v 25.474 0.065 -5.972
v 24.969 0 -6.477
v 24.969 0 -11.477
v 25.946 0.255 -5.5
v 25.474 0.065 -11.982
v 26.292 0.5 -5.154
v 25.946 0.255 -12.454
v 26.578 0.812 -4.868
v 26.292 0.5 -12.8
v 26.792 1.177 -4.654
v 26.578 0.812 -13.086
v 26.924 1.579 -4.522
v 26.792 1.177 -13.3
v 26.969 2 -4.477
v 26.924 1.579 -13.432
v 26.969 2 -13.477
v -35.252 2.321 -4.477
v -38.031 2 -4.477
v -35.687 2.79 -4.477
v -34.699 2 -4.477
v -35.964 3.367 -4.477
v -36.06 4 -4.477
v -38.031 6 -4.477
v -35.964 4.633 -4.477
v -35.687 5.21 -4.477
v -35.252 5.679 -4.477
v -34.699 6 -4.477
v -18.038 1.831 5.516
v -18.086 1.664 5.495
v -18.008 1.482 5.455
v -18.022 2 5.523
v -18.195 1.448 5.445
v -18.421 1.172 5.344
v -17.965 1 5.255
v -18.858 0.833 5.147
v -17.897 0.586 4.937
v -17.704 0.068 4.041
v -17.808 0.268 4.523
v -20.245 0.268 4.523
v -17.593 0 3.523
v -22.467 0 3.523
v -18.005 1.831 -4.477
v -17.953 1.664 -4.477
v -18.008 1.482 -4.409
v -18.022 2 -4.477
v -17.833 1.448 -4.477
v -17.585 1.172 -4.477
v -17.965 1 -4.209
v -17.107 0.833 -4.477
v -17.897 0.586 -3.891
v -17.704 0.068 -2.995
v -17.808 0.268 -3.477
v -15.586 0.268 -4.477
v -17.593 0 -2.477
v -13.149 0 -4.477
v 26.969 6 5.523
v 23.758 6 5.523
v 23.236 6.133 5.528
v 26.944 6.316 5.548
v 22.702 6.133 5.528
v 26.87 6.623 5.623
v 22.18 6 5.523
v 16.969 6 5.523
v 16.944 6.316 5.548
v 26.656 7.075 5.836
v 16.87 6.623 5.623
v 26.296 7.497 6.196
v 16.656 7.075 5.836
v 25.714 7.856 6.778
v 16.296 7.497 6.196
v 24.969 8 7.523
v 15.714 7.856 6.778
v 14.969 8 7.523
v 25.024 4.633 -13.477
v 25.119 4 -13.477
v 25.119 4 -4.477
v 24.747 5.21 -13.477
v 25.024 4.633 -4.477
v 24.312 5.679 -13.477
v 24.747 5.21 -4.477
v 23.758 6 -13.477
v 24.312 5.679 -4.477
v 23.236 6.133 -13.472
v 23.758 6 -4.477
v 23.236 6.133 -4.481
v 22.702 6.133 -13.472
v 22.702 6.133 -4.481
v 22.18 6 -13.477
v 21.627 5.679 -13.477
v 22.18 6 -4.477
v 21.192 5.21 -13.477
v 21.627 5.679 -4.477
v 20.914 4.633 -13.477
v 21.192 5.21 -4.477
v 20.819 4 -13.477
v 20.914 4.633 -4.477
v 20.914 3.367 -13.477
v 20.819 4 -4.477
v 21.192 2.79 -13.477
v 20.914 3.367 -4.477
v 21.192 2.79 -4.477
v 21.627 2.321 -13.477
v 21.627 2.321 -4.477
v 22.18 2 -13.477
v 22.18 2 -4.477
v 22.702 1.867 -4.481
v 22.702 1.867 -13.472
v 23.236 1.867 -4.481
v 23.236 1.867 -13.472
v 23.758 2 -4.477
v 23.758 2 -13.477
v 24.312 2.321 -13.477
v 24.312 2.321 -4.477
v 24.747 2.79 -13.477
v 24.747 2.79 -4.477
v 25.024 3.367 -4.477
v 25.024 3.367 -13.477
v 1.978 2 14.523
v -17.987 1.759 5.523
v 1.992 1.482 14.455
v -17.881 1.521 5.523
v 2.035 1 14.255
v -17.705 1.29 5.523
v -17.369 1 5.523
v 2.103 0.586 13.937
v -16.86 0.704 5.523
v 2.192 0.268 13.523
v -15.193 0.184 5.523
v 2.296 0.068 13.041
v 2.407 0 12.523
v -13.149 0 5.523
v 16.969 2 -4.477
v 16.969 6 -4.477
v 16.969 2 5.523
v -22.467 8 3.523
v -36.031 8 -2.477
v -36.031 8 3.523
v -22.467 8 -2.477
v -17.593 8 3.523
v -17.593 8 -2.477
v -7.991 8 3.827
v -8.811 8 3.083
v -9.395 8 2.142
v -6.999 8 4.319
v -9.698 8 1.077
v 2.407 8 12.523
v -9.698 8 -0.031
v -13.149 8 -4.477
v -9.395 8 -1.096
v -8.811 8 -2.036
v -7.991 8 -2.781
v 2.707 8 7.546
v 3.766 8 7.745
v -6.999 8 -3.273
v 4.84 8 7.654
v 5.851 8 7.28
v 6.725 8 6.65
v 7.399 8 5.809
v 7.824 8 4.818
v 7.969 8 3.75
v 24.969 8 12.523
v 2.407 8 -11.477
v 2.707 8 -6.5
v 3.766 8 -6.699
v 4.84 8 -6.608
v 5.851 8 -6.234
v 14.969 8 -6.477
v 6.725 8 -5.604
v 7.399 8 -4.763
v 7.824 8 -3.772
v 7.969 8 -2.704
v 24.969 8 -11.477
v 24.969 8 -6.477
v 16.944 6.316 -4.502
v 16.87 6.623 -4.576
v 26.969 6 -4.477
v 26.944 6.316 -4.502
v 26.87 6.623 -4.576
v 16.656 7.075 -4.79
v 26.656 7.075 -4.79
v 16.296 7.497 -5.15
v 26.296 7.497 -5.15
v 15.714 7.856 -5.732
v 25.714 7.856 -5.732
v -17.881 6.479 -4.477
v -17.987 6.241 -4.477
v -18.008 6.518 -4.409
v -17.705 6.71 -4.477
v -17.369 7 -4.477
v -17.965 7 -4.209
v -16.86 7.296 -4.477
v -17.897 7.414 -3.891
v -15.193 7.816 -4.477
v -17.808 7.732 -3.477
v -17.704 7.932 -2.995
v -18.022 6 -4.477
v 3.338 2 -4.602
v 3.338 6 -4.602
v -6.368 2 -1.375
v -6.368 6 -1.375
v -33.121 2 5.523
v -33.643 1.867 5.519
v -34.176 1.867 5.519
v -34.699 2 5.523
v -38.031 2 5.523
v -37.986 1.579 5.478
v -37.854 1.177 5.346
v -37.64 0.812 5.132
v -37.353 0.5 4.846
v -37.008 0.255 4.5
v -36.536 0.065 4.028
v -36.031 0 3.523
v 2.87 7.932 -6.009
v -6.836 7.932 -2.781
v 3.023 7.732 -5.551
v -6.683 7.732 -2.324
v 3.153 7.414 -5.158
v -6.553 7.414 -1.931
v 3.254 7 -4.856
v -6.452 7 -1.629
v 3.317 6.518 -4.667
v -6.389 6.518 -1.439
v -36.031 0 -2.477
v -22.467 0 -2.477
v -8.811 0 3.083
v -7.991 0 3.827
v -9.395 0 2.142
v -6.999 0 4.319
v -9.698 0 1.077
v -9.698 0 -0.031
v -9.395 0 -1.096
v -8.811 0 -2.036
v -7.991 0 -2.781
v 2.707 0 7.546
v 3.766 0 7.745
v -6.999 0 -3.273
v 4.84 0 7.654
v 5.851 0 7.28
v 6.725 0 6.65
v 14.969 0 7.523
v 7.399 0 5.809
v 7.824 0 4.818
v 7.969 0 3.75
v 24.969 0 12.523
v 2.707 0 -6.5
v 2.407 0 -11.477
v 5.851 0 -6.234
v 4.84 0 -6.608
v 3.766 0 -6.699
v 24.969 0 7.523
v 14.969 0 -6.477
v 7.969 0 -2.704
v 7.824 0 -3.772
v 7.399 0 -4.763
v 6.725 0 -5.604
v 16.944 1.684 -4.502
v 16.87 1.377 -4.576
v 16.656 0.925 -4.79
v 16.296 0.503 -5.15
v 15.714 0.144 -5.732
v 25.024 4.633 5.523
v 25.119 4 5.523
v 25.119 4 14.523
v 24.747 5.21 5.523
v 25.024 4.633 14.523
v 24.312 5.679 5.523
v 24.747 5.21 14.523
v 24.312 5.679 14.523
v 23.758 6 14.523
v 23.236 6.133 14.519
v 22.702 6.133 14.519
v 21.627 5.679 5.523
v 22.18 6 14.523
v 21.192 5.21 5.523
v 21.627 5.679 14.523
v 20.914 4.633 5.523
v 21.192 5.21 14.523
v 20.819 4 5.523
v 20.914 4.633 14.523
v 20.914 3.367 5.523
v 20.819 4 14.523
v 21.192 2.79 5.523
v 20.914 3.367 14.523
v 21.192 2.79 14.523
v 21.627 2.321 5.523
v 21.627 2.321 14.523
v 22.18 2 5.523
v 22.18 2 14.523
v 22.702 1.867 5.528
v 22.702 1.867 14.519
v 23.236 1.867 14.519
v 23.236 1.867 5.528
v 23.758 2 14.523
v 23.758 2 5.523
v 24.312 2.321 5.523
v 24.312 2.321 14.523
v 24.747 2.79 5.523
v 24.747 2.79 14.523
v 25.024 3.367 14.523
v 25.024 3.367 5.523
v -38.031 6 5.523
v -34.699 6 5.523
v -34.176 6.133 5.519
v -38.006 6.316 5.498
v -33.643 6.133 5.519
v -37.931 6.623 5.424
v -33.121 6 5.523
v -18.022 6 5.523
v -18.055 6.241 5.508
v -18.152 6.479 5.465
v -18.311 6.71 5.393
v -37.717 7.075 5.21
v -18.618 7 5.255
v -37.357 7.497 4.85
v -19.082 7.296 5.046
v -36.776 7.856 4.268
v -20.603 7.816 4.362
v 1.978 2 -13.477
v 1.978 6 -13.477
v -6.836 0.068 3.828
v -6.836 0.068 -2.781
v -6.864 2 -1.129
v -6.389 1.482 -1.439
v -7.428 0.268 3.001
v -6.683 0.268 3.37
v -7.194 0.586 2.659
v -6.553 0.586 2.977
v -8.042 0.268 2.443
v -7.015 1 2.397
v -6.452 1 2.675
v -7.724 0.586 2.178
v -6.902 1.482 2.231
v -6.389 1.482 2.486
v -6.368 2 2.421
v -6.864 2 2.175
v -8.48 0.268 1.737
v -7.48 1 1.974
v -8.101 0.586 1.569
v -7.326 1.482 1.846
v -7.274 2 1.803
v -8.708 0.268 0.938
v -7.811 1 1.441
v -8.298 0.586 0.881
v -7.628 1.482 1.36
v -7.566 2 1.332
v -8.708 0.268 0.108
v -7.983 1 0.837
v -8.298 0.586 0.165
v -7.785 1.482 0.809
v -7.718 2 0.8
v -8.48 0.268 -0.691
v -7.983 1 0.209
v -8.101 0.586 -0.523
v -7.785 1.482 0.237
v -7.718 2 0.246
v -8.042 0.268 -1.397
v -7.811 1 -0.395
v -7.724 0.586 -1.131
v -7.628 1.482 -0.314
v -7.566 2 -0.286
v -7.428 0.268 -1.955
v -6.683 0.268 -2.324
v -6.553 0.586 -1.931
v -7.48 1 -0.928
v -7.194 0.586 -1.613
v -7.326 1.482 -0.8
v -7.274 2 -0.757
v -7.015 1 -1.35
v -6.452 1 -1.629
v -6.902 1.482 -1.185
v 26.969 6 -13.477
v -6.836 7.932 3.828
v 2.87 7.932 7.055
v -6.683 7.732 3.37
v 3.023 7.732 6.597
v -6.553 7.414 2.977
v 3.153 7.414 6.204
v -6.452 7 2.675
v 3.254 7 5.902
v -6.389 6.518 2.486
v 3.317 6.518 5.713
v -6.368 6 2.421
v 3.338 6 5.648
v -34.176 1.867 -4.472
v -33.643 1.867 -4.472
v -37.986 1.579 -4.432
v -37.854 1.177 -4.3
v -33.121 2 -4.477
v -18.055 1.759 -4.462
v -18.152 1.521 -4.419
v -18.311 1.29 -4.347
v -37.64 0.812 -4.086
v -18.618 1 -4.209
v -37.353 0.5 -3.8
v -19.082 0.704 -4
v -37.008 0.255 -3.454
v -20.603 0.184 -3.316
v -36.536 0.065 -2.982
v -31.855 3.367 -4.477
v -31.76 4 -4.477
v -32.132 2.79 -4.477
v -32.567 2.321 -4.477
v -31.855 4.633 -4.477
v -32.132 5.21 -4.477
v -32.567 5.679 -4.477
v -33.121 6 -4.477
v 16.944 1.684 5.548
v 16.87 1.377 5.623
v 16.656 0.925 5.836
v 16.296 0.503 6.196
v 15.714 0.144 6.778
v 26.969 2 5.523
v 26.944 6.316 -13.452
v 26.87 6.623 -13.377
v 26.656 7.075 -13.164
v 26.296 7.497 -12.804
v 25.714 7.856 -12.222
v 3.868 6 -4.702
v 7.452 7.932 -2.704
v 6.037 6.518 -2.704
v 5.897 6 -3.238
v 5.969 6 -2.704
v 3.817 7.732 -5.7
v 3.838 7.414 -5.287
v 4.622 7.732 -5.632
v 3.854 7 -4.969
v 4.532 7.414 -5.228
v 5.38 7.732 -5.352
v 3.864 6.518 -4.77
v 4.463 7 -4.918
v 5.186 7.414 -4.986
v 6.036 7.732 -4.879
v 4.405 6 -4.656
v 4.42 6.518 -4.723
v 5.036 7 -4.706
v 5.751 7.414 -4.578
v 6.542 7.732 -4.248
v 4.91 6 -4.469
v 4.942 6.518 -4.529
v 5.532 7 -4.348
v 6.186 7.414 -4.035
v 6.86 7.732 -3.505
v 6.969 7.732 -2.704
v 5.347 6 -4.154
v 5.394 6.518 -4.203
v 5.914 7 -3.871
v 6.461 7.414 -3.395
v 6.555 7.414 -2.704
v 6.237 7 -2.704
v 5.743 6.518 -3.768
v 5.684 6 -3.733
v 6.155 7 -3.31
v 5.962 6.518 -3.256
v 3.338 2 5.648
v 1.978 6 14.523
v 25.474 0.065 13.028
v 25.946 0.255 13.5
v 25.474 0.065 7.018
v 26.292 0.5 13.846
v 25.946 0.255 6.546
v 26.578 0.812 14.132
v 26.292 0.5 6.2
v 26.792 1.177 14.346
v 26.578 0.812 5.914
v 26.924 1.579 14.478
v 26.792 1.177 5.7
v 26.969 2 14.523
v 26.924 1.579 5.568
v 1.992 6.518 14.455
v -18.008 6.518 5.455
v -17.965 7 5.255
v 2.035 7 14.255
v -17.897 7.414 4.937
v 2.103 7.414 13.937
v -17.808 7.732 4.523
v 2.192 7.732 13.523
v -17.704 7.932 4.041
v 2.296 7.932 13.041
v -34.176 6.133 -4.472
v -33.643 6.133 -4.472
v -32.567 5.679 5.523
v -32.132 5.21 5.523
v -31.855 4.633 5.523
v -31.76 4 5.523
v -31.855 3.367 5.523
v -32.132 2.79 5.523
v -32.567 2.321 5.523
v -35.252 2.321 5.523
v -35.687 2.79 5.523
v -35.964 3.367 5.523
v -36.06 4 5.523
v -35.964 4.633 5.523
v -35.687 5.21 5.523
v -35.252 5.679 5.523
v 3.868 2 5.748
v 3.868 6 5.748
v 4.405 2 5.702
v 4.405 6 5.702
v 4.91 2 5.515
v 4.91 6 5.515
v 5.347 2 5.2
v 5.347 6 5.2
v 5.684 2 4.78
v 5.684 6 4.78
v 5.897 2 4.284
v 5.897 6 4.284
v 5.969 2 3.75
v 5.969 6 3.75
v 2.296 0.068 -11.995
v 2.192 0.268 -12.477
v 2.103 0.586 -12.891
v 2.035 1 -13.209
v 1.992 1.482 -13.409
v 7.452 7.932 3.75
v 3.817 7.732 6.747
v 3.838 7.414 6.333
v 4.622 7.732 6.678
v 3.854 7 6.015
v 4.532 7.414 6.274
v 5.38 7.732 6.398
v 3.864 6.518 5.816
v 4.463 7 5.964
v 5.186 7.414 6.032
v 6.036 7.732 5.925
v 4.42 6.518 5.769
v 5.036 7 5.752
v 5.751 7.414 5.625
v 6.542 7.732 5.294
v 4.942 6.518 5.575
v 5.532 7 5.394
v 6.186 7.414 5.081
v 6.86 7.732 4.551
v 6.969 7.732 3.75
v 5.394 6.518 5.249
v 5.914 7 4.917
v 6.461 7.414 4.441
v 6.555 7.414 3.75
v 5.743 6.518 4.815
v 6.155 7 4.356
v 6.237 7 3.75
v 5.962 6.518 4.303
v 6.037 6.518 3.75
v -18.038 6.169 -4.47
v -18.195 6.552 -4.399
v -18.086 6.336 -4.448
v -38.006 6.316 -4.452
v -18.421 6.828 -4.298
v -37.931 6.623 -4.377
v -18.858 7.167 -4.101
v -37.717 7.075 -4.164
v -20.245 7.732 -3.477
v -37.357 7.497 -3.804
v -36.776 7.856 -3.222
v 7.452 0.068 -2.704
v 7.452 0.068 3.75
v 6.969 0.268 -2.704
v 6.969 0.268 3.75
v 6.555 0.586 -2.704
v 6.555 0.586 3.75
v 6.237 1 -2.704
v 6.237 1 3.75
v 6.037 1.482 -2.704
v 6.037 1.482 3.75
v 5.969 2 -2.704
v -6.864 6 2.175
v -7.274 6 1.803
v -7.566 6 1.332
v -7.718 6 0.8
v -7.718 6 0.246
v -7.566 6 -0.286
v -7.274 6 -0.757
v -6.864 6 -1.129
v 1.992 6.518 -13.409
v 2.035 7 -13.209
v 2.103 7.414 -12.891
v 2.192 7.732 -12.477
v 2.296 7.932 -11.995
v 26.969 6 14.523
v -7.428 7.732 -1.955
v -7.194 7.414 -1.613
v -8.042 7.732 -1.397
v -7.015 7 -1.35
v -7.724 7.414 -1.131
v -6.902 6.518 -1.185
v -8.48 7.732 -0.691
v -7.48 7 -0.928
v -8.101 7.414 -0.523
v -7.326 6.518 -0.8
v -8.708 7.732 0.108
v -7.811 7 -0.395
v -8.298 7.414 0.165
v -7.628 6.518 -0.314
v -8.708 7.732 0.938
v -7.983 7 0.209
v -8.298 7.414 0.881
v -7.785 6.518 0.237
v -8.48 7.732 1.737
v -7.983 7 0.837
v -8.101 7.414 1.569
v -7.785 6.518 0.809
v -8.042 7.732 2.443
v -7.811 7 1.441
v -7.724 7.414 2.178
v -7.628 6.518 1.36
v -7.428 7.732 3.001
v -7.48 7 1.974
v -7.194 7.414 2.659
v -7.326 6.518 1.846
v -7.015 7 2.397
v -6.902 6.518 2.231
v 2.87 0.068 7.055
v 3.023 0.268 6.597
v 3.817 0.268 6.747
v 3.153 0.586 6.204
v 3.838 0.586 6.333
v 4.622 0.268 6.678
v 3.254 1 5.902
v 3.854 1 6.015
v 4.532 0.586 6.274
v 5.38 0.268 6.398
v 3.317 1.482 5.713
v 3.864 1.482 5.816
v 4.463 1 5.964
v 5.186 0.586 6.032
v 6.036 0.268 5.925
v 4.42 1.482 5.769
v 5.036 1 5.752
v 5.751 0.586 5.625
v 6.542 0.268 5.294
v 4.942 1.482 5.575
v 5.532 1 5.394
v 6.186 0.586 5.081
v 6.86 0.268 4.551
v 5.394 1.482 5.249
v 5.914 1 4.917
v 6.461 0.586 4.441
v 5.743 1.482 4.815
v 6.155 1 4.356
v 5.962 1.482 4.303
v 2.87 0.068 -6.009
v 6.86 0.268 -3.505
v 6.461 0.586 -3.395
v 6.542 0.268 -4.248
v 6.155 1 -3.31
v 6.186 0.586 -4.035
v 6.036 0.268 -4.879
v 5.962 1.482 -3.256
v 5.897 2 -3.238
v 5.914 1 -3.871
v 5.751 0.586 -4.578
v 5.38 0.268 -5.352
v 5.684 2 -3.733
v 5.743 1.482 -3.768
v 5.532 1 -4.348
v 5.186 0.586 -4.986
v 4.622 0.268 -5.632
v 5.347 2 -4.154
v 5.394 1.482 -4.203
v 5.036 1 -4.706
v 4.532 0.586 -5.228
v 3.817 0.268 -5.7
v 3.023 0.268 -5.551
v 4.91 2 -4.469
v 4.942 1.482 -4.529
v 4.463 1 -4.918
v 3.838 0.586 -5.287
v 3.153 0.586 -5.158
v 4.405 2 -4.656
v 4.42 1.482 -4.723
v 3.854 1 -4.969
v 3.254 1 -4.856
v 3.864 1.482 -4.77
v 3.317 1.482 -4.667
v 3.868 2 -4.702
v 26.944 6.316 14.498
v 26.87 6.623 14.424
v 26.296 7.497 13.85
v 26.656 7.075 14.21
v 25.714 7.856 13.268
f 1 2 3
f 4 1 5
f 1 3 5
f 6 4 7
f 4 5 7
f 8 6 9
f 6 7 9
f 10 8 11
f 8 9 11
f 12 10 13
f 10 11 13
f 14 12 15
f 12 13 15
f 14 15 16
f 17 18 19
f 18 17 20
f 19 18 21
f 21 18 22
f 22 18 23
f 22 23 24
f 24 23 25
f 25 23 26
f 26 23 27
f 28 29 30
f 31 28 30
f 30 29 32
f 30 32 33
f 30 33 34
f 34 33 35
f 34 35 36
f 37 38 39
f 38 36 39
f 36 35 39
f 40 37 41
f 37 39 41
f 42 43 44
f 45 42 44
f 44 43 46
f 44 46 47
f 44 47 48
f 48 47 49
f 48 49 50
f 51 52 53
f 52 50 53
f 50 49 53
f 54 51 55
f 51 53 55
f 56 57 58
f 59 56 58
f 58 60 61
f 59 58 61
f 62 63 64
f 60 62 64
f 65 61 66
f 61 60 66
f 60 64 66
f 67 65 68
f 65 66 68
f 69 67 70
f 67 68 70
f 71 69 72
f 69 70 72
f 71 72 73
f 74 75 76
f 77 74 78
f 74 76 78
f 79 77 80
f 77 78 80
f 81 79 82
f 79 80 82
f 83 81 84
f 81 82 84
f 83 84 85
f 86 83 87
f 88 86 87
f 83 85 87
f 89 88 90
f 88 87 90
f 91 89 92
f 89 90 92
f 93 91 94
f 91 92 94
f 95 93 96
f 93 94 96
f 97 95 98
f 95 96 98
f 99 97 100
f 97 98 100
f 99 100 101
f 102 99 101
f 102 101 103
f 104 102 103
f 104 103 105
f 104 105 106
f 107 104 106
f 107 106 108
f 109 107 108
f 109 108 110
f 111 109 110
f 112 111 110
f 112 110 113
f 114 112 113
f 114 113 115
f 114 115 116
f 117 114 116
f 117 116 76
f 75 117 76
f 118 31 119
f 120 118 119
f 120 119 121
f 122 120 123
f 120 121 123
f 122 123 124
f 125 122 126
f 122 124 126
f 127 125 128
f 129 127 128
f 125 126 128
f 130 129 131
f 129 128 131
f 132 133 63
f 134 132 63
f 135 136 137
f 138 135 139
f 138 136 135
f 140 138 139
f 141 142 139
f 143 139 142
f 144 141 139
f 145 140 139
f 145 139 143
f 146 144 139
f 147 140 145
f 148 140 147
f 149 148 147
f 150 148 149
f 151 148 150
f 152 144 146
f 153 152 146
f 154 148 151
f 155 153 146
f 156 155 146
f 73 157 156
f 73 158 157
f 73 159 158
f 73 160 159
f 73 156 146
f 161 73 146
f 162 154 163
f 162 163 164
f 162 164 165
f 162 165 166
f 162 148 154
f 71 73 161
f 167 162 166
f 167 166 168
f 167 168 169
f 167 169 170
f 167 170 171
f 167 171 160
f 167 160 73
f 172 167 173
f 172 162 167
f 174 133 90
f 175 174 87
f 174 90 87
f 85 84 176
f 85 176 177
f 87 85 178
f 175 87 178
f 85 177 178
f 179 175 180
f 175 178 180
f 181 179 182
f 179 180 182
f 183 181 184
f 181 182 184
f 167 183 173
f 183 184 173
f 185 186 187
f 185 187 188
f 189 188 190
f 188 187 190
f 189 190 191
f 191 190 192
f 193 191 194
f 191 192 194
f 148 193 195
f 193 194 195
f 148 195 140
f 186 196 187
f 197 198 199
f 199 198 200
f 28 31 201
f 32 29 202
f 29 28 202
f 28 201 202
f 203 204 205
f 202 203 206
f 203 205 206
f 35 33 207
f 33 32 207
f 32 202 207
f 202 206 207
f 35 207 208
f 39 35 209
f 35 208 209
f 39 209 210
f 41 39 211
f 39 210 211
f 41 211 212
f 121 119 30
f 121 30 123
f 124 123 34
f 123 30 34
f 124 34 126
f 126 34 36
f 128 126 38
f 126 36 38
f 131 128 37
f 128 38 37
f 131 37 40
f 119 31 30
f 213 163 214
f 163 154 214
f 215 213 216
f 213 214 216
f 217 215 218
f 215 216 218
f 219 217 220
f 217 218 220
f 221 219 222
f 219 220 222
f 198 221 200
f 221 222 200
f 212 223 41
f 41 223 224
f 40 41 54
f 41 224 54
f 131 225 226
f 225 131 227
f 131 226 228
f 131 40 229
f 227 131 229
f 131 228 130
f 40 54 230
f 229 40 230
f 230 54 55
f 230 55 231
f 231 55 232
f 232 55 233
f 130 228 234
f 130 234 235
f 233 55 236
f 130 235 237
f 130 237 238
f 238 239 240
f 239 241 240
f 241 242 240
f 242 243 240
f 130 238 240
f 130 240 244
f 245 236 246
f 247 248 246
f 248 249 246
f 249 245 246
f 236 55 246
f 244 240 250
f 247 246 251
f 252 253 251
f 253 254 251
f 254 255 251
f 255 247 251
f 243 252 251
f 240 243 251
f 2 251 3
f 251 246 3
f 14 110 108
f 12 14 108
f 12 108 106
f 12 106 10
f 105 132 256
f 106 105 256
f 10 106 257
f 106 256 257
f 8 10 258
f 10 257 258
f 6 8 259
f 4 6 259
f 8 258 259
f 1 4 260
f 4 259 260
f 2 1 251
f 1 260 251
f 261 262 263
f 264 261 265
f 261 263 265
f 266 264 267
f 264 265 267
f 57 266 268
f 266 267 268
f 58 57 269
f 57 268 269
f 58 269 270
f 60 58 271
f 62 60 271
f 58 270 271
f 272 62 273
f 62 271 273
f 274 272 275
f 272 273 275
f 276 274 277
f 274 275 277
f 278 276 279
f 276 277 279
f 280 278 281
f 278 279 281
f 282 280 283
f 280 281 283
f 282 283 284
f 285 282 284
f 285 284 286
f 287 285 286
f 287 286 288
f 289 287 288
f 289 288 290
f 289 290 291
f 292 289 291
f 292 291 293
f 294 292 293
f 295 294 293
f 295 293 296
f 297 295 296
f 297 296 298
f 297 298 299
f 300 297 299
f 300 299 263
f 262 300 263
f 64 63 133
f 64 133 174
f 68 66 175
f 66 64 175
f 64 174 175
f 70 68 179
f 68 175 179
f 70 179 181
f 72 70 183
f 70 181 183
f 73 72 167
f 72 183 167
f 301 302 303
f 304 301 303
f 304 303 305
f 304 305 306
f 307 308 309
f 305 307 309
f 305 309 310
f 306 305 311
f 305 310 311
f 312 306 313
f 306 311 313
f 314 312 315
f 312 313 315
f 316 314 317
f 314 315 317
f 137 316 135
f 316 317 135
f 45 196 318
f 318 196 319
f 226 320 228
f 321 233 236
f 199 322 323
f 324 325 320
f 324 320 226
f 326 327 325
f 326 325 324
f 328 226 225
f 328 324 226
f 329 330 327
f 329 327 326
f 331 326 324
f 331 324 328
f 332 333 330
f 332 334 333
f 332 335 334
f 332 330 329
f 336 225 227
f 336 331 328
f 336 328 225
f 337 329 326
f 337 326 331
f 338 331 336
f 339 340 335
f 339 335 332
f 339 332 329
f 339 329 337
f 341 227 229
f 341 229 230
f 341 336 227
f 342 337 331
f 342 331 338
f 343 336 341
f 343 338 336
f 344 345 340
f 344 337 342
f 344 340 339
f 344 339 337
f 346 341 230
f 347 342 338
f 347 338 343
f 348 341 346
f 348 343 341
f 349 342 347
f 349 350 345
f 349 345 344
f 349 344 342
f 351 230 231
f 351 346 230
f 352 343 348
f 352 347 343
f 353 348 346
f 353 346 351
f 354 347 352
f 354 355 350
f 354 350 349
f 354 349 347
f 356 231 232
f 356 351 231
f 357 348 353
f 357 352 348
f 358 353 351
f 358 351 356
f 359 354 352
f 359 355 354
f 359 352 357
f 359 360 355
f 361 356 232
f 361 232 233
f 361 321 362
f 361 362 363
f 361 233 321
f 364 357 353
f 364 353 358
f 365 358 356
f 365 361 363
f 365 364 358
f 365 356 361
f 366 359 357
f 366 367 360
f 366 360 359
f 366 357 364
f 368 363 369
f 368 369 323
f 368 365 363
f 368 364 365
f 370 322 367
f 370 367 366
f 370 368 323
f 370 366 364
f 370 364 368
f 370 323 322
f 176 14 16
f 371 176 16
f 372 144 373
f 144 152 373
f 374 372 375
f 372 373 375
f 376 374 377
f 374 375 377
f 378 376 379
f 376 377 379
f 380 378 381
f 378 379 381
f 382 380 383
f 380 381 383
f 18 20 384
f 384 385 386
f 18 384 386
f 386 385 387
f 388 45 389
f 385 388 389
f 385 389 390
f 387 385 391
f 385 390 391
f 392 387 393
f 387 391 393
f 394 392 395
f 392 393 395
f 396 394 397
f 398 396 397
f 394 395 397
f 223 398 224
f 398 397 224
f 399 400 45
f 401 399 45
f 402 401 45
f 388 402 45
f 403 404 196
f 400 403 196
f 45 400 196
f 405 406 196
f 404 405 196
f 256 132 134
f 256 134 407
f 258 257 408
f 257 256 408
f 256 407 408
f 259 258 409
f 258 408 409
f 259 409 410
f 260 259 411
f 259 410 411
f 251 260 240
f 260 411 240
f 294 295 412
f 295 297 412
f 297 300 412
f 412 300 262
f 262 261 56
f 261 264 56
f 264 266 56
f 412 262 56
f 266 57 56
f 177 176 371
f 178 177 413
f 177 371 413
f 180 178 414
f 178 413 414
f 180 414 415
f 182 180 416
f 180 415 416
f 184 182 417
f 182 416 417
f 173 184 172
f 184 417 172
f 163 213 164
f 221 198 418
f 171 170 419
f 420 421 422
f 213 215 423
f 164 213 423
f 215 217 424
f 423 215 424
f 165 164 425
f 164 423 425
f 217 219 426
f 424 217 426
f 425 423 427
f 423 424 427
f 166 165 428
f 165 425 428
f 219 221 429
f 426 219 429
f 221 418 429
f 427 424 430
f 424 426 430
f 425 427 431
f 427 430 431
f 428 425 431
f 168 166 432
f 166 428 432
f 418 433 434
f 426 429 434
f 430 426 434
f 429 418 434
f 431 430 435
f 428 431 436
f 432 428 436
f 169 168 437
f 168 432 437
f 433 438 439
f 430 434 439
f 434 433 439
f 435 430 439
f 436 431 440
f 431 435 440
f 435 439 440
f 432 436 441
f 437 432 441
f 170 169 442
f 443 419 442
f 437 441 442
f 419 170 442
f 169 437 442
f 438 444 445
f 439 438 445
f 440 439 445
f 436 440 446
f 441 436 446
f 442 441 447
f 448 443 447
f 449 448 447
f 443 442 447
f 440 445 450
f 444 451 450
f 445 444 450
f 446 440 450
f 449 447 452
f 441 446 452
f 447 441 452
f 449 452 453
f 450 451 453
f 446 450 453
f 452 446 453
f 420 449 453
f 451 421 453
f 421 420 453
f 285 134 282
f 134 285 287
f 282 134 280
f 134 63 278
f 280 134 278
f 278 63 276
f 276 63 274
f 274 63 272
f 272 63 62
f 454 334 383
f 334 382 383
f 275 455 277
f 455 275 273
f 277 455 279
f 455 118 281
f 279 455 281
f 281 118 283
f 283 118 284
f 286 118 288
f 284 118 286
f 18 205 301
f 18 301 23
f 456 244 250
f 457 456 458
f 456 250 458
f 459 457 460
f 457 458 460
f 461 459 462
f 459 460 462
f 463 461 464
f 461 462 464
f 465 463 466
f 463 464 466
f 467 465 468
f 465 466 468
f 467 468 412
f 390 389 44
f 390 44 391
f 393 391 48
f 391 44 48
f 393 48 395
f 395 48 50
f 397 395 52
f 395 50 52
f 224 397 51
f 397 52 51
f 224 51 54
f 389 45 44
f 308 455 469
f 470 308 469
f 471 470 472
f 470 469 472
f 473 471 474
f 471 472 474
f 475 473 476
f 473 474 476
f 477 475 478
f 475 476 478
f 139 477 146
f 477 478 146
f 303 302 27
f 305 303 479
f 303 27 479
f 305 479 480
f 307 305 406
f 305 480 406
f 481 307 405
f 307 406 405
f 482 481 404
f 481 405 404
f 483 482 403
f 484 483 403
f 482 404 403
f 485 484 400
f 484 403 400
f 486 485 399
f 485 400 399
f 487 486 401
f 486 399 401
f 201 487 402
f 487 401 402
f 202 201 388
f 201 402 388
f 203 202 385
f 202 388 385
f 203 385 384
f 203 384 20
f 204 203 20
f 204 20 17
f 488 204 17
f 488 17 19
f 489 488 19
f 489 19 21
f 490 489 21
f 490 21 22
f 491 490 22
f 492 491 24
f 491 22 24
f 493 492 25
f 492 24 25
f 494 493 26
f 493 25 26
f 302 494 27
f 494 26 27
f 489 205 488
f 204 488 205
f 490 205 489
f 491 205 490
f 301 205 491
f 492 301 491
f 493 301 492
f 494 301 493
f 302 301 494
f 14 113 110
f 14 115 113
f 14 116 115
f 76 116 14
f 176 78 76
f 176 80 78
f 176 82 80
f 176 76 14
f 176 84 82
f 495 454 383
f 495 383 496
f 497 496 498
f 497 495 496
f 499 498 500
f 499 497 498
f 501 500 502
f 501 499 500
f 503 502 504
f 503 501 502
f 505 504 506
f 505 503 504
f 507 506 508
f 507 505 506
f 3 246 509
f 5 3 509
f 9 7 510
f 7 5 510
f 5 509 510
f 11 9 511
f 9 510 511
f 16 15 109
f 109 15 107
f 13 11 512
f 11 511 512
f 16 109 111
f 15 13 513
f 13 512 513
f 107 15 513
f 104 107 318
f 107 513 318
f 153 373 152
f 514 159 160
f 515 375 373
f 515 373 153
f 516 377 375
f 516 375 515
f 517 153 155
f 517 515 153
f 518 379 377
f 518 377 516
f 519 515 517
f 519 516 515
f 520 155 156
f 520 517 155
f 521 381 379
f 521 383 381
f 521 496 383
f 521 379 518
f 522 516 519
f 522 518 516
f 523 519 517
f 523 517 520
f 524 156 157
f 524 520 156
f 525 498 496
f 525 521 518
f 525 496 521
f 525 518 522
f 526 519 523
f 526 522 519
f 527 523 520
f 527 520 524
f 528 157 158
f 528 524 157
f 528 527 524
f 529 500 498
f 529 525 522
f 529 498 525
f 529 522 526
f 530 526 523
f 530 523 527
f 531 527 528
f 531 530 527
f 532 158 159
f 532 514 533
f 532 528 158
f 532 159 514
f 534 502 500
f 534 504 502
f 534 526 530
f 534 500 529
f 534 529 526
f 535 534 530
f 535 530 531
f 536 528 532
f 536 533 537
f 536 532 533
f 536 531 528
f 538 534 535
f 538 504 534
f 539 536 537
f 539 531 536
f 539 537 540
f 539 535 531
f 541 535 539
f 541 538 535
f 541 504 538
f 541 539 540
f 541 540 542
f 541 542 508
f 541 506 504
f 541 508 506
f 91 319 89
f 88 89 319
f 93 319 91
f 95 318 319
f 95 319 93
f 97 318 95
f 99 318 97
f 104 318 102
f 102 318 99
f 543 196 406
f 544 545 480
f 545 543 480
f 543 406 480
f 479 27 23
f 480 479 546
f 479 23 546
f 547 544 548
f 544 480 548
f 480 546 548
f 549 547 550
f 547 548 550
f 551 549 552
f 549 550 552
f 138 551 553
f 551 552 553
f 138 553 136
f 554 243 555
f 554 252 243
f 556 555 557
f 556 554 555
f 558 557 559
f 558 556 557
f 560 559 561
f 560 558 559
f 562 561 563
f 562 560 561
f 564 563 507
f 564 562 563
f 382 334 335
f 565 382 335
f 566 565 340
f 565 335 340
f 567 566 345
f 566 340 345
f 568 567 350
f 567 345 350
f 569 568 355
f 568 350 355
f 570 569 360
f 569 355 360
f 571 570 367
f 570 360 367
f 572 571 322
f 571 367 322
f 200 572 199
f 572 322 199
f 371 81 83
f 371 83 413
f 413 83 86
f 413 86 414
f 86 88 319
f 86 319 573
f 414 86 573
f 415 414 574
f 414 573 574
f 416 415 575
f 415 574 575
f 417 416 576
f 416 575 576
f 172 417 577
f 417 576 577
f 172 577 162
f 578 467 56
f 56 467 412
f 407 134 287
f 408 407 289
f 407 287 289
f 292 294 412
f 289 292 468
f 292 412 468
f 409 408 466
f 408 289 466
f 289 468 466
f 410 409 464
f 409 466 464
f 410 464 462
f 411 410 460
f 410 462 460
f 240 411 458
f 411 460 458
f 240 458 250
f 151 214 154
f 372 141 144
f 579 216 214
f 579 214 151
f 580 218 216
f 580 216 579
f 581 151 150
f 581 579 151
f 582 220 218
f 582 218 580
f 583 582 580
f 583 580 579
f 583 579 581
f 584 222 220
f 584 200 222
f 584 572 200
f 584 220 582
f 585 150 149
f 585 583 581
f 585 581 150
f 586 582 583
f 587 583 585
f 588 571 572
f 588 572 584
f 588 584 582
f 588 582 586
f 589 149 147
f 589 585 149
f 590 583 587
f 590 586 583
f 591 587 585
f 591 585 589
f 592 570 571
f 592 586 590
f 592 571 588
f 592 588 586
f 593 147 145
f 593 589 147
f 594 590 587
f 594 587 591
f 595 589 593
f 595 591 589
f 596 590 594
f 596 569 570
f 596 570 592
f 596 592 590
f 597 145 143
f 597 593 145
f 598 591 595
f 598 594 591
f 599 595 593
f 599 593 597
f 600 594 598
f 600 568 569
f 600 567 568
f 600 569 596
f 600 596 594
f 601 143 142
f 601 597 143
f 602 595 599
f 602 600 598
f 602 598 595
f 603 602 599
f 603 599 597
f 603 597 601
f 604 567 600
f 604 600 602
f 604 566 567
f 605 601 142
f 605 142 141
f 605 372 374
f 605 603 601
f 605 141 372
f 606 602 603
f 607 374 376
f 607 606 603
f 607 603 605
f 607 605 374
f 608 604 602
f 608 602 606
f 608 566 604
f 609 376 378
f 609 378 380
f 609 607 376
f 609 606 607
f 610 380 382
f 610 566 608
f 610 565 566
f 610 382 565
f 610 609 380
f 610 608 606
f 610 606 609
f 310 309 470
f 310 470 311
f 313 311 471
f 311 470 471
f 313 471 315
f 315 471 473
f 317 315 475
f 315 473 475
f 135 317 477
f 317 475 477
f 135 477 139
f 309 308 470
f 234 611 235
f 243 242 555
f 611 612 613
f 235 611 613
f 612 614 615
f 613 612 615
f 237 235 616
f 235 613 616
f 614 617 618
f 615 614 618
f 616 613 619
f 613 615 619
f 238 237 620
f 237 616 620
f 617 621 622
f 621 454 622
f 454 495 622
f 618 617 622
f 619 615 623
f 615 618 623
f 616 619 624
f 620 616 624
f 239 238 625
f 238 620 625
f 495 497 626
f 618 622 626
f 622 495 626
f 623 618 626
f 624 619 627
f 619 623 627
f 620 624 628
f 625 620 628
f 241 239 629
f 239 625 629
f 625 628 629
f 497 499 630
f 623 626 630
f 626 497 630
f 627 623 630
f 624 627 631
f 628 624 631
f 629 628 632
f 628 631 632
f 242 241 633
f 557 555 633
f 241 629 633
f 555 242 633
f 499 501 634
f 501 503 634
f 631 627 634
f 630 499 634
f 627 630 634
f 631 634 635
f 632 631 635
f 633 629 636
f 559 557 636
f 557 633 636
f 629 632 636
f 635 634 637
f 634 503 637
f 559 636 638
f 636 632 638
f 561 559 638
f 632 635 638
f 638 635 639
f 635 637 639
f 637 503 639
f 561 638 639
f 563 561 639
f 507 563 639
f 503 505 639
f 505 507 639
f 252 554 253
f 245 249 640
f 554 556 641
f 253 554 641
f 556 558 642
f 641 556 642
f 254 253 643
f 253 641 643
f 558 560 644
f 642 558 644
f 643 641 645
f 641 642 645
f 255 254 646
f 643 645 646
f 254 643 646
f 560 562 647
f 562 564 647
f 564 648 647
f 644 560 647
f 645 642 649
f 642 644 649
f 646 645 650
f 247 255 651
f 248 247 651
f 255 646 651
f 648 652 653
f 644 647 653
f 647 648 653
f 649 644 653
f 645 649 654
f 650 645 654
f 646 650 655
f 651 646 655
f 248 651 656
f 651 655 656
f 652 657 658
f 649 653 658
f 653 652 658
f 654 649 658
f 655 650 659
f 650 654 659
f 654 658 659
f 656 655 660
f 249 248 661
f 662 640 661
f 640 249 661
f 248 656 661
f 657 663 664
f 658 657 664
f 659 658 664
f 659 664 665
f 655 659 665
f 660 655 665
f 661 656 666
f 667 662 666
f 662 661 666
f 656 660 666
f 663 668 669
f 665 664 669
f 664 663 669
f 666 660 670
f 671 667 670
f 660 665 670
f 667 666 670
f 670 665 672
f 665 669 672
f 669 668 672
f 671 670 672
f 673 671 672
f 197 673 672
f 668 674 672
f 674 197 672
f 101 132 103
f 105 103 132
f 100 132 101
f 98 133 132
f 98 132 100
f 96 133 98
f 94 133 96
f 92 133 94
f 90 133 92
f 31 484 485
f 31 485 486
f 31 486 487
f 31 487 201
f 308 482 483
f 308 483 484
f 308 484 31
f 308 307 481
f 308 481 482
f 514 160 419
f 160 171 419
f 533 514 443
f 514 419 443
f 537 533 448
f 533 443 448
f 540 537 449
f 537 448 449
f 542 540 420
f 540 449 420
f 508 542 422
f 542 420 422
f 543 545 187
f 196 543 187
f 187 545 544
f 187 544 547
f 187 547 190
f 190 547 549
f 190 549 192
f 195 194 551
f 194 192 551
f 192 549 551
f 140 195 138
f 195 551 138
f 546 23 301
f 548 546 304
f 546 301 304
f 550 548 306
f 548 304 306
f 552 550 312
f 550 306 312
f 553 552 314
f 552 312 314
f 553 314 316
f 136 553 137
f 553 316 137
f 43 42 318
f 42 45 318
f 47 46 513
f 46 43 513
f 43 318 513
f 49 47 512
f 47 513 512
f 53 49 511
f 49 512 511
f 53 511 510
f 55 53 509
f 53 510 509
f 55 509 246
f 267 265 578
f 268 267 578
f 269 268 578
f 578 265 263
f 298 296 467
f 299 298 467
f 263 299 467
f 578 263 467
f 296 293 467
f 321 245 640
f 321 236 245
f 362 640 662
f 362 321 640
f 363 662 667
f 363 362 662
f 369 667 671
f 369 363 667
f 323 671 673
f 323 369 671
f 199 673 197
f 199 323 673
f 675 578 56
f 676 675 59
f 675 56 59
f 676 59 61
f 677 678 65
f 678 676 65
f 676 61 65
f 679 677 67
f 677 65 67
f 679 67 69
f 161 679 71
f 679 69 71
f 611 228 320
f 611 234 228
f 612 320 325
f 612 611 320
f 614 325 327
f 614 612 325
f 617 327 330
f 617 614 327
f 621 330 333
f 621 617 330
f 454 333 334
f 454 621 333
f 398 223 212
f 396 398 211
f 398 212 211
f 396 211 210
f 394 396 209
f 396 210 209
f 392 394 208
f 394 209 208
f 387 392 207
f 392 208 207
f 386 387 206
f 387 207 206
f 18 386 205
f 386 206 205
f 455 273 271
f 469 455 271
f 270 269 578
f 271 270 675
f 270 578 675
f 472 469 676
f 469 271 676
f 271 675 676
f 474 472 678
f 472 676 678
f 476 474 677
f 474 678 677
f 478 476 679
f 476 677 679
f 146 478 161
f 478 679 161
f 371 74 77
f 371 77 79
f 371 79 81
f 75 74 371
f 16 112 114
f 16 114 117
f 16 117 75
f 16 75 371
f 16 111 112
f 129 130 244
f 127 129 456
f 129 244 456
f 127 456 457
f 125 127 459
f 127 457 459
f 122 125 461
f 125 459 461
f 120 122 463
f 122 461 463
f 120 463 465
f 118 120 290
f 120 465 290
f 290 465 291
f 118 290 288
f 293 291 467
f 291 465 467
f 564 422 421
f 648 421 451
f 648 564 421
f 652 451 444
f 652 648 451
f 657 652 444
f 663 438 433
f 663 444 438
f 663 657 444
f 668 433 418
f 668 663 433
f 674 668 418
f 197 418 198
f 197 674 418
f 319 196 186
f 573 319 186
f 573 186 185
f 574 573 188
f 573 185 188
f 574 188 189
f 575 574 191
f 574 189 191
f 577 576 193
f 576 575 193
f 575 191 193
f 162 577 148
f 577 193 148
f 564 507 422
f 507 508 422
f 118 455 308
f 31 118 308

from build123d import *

# Parameters (mm, degrees)
SKETCH1_W           = 65
SKETCH1_H           = 28
BOSS_EXTRUDE1_DEPTH = 8
SKETCH2_W           = 10
SKETCH2_H           = 10
CUT_EXTRUDE1_DEPTH  = 10
SKETCH3_R           = 2.15
CUT_EXTRUDE2_DEPTH  = 48.899263129
SKETCH5_W           = 20.008392886
SKETCH5_H           = 9
CUT_EXTRUDE4_DEPTH  = 42.488060591
FILLET1_R           = 2
SKETCH8_R           = 2.15
CUT_EXTRUDE5_DEPTH  = 44.258980729
CUT_EXTRUDE6_DEPTH  = 10
FILLET2_R           = 2


with BuildPart() as part:
    # Sketch1 → Boss-Extrude1 (new body)
    with BuildSketch(Plane(origin=(0, 0, 0), x_dir=(1, 0, 0), z_dir=(0, 1, 0))):
        with Locations((-5.530769231, -0.523076923)):
            Rectangle(SKETCH1_W, SKETCH1_H)
    extrude(amount=BOSS_EXTRUDE1_DEPTH)

    # Sketch2 → Cut-Extrude1 (cut)
    with BuildSketch(Plane(origin=(0, 8, 0), x_dir=(1, 0, 0), z_dir=(0, 1, 0))):
        with Locations((21.969230769, -0.523076923)):
            Rectangle(SKETCH2_W, SKETCH2_H)
    extrude(amount=-CUT_EXTRUDE1_DEPTH, mode=Mode.SUBTRACT)

    # Sketch3 → Cut-Extrude2 (cut, through all)
    with BuildSketch(Plane.XY.offset(14.523076923)):
        with Locations((22.969230769, 4)):
            Circle(SKETCH3_R)
    extrude(amount=-CUT_EXTRUDE2_DEPTH, mode=Mode.SUBTRACT)

    # Sketch5 → Cut-Extrude4 (cut, through all)
    with BuildSketch(Plane(origin=(0, 8, 0), x_dir=(1, 0, 0), z_dir=(0, 1, 0))):
        with Locations((-28.026572788, 8.976923077)):
            Rectangle(SKETCH5_W, SKETCH5_H)
        Polygon((-18.022376345, 13.476923077), (-18.022376345, 4.476923077), (1.977623655, 13.476923077), align=None)
        Polygon((1.977623655, -14.523076923), (-18.022376345, -5.523076923), (-18.022376345, -14.523076923), align=None)
        with Locations((-28.026572788, -10.023076923)):
            Rectangle(SKETCH5_W, SKETCH5_H)
    extrude(amount=-CUT_EXTRUDE4_DEPTH, mode=Mode.SUBTRACT)

    # Fillet1
    # the kernel refuses this fillet: 2 mm, written as the material it takes off along each edge
    with BuildSketch(Plane(origin=(26.969230769, 0, -18.476923077), x_dir=(-1, 0, 0), z_dir=(0, 0, 1)), Plane(origin=(26.969230769, 0, 0.523076923), x_dir=(-1, 0, 0), z_dir=(0, 0, 1))) as fillet1_piece_1:
        with BuildLine():
            CenterArc((FILLET1_R, -FILLET1_R), FILLET1_R, 90, 90)
            Line((0, -FILLET1_R), (0, 0))
            Line((0, 0), (FILLET1_R, 0))
        make_face()
    extrude(amount=19, mode=Mode.SUBTRACT)
    with BuildSketch(Plane(origin=(16.969230769, 0, -4.476923077), x_dir=(0, 0, -1), z_dir=(1, 0, 0)), Plane(origin=(31.969230769, 0, 5.523076923), x_dir=(0, 0, 1), z_dir=(-1, 0, 0)), Plane(origin=(31.969230769, 8, -4.476923077), x_dir=(0, 0, -1), z_dir=(-1, 0, 0)), Plane(origin=(16.969230769, 8, 5.523076923), x_dir=(0, 0, 1), z_dir=(1, 0, 0))) as fillet1_piece_2:
        with BuildLine():
            CenterArc((FILLET1_R, FILLET1_R), FILLET1_R, 180, 90)
            Line((0, FILLET1_R), (0, 0))
            Line((0, 0), (FILLET1_R, 0))
        make_face()
    extrude(amount=15, mode=Mode.SUBTRACT)
    with BuildSketch(Plane(origin=(16.969230769, 0, 5.523076923), x_dir=(-1, 0, 0), z_dir=(0, 0, -1)), Plane(origin=(16.969230769, 8, -4.476923077), x_dir=(-1, 0, 0), z_dir=(0, 0, 1))) as fillet1_piece_3:
        with BuildLine():
            CenterArc((FILLET1_R, FILLET1_R), FILLET1_R, 180, 90)
            Line((0, FILLET1_R), (0, 0))
            Line((0, 0), (FILLET1_R, 0))
        make_face()
    extrude(amount=10, mode=Mode.SUBTRACT)
    with BuildSketch(Plane(origin=(26.969230769, 8, -18.476923077), x_dir=(-1, 0, 0), z_dir=(0, 0, 1)), Plane(origin=(26.969230769, 8, 0.523076923), x_dir=(-1, 0, 0), z_dir=(0, 0, 1))) as fillet1_piece_4:
        with BuildLine():
            CenterArc((FILLET1_R, FILLET1_R), FILLET1_R, 180, 90)
            Line((0, FILLET1_R), (0, 0))
            Line((0, 0), (FILLET1_R, 0))
        make_face()
    extrude(amount=19, mode=Mode.SUBTRACT)
    with BuildSketch(Plane(origin=(31.969230769, 0, 14.523076923), x_dir=(0, 1, 0), z_dir=(-1, 0, 0)), Plane(origin=(-3.022376345, 8, -13.476923077), x_dir=(0, 0, 1), z_dir=(1, 0, 0))) as fillet1_piece_5:
        with BuildLine():
            CenterArc((FILLET1_R, FILLET1_R), FILLET1_R, 180, 90)
            Line((0, FILLET1_R), (0, 0))
            Line((0, 0), (FILLET1_R, 0))
        make_face()
    extrude(amount=34.991607114, mode=Mode.SUBTRACT)
    with BuildSketch(Plane(origin=(-38.030769231, 0, 10.523076923), x_dir=(1, 0, 0), z_dir=(0, 0, -1))) as fillet1_piece_6:
        with BuildLine():
            CenterArc((FILLET1_R, -FILLET1_R), FILLET1_R, 90, 90)
            Line((0, -FILLET1_R), (0, 0))
            Line((0, 0), (FILLET1_R, 0))
        make_face()
    extrude(amount=20, mode=Mode.SUBTRACT)
    with BuildSketch(Plane(origin=(-38.030769231, 8, 10.523076923), x_dir=(1, 0, 0), z_dir=(0, 0, -1))) as fillet1_piece_7:
        with BuildLine():
            CenterArc((FILLET1_R, FILLET1_R), FILLET1_R, 180, 90)
            Line((0, FILLET1_R), (0, 0))
            Line((0, 0), (FILLET1_R, 0))
        make_face()
    extrude(amount=20, mode=Mode.SUBTRACT)
    with BuildSketch(Plane(origin=(31.969230769, 8, 14.523076923), x_dir=(0, -1, 0), z_dir=(-1, 0, 0)), Plane(origin=(-3.022376345, 0, -13.476923077), x_dir=(0, 0, 1), z_dir=(1, 0, 0))) as fillet1_piece_8:
        with BuildLine():
            CenterArc((FILLET1_R, -FILLET1_R), FILLET1_R, 90, 90)
            Line((0, -FILLET1_R), (0, 0))
            Line((0, 0), (FILLET1_R, 0))
        make_face()
    extrude(amount=34.991607114, mode=Mode.SUBTRACT)
    with BuildSketch(Plane(origin=(-13.022376345, 0, -4.476923077), x_dir=(0, 0, 1), z_dir=(-1, 0, 0))) as fillet1_piece_9_section:
        with BuildLine():
            CenterArc((FILLET1_R, FILLET1_R), FILLET1_R, 180, 90)
            Line((0, FILLET1_R), (0, 0))
            Line((0, 0), (FILLET1_R, 0))
        make_face()
    fillet1_piece_9 = extrude(amount=30.008392886, mode=Mode.PRIVATE)
    fillet1_piece_9 = split(fillet1_piece_9, bisect_by=Plane(origin=(-28.986353443, 0.462958452, 0.456866617), z_dir=(-0.4103646773287979, 0, -0.9119215051751064)), keep=Keep.TOP, mode=Mode.PRIVATE)
    add(fillet1_piece_9, mode=Mode.SUBTRACT)
    with BuildSketch(Plane(origin=(6.537231181, 0, -15.528746464), x_dir=(0.41036467732879783, 0, 0.9119215051751064), z_dir=(-0.9119215051751064, 0, 0.4103646773287979))) as fillet1_piece_10_section:
        with BuildLine():
            CenterArc((FILLET1_R, FILLET1_R), FILLET1_R, 180, 90)
            Line((0, FILLET1_R), (0, 0))
            Line((0, 0), (FILLET1_R, 0))
        make_face()
    fillet1_piece_10 = extrude(amount=31.931712199, mode=Mode.PRIVATE)
    fillet1_piece_10 = split(fillet1_piece_10, bisect_by=Plane(origin=(-5.120660907, 0.462204108, -4.476923077), z_dir=(0, 0, -1)), keep=Keep.TOP, mode=Mode.PRIVATE)
    add(fillet1_piece_10, mode=Mode.SUBTRACT)
    with BuildSketch(Plane(origin=(-43.030769231, 8, -4.476923077), x_dir=(0, 0, 1), z_dir=(1, 0, 0))) as fillet1_piece_11_section:
        with BuildLine():
            CenterArc((FILLET1_R, FILLET1_R), FILLET1_R, 180, 90)
            Line((0, FILLET1_R), (0, 0))
            Line((0, 0), (FILLET1_R, 0))
        make_face()
    fillet1_piece_11 = extrude(amount=30.008392886, mode=Mode.PRIVATE)
    fillet1_piece_11 = split(fillet1_piece_11, bisect_by=Plane(origin=(-28.986353443, 7.537041548, 0.456866617), z_dir=(-0.4103646773287979, 0, -0.9119215051751064)), keep=Keep.TOP, mode=Mode.PRIVATE)
    add(fillet1_piece_11, mode=Mode.SUBTRACT)
    with BuildSketch(Plane(origin=(-22.581983871, 8, -2.42509969), x_dir=(0.4103646773287979, 0, 0.9119215051751064), z_dir=(0.9119215051751064, 0, -0.4103646773287979))) as fillet1_piece_12_section:
        with BuildLine():
            CenterArc((FILLET1_R, FILLET1_R), FILLET1_R, 180, 90)
            Line((0, FILLET1_R), (0, 0))
            Line((0, 0), (FILLET1_R, 0))
        make_face()
    fillet1_piece_12 = extrude(amount=31.931712199, mode=Mode.PRIVATE)
    fillet1_piece_12 = split(fillet1_piece_12, bisect_by=Plane(origin=(-5.120660907, 7.537795892, -4.476923077), z_dir=(0, 0, -1)), keep=Keep.TOP, mode=Mode.PRIVATE)
    add(fillet1_piece_12, mode=Mode.SUBTRACT)
    with BuildSketch(Plane(origin=(6.537231181, 8, 16.57490031), x_dir=(0, -1, 0), z_dir=(-0.9119215051751064, 0, -0.41036467732879806))) as fillet1_piece_13_section:
        with BuildLine():
            CenterArc((FILLET1_R, -FILLET1_R), FILLET1_R, 90, 90)
            Line((0, -FILLET1_R), (0, 0))
            Line((0, 0), (FILLET1_R, 0))
        make_face()
    fillet1_piece_13 = extrude(amount=31.931712199, mode=Mode.PRIVATE)
    fillet1_piece_13 = split(fillet1_piece_13, bisect_by=Plane(origin=(-5.120660907, 7.537795892, 5.523076923), z_dir=(0, 0, 1)), keep=Keep.TOP, mode=Mode.PRIVATE)
    add(fillet1_piece_13, mode=Mode.SUBTRACT)
    with BuildSketch(Plane(origin=(-13.022376345, 8, 5.523076923), x_dir=(0, 0, -1), z_dir=(-1, 0, 0))) as fillet1_piece_14_section:
        with BuildLine():
            CenterArc((FILLET1_R, FILLET1_R), FILLET1_R, 180, 90)
            Line((0, FILLET1_R), (0, 0))
            Line((0, 0), (FILLET1_R, 0))
        make_face()
    fillet1_piece_14 = extrude(amount=30.008392886, mode=Mode.PRIVATE)
    fillet1_piece_14 = split(fillet1_piece_14, bisect_by=Plane(origin=(-28.986353443, 7.537041548, 0.589287229), z_dir=(-0.41036467732879806, 0, 0.9119215051751064)), keep=Keep.TOP, mode=Mode.PRIVATE)
    add(fillet1_piece_14, mode=Mode.SUBTRACT)
    with BuildSketch(Plane(origin=(-22.581983871, 0, 3.471253536), x_dir=(0.41036467732879806, 0, -0.9119215051751064), z_dir=(0.9119215051751064, 0, 0.41036467732879806))) as fillet1_piece_15_section:
        with BuildLine():
            CenterArc((FILLET1_R, FILLET1_R), FILLET1_R, 180, 90)
            Line((0, FILLET1_R), (0, 0))
            Line((0, 0), (FILLET1_R, 0))
        make_face()
    fillet1_piece_15 = extrude(amount=31.931712199, mode=Mode.PRIVATE)
    fillet1_piece_15 = split(fillet1_piece_15, bisect_by=Plane(origin=(-5.120660907, 0.462204108, 5.523076923), z_dir=(0, 0, 1)), keep=Keep.TOP, mode=Mode.PRIVATE)
    add(fillet1_piece_15, mode=Mode.SUBTRACT)
    with BuildSketch(Plane(origin=(-43.030769231, 0, 5.523076923), x_dir=(0, 0, -1), z_dir=(1, 0, 0))) as fillet1_piece_16_section:
        with BuildLine():
            CenterArc((FILLET1_R, FILLET1_R), FILLET1_R, 180, 90)
            Line((0, FILLET1_R), (0, 0))
            Line((0, 0), (FILLET1_R, 0))
        make_face()
    fillet1_piece_16 = extrude(amount=30.008392886, mode=Mode.PRIVATE)
    fillet1_piece_16 = split(fillet1_piece_16, bisect_by=Plane(origin=(-28.986353443, 0.462958452, 0.589287229), z_dir=(-0.41036467732879806, 0, 0.9119215051751064)), keep=Keep.TOP, mode=Mode.PRIVATE)
    add(fillet1_piece_16, mode=Mode.SUBTRACT)
    with BuildSketch(Plane(origin=(16.969230769, 0, 5.523076923), x_dir=(-1, 0, 0), z_dir=(0, 0, -1))) as fillet1_piece_17a_section:
        with BuildLine():
            CenterArc((FILLET1_R, FILLET1_R), FILLET1_R, 180, 90)
            Line((0, FILLET1_R), (0, 0))
            Line((0, 0), (FILLET1_R, 0))
        make_face()
    fillet1_piece_17a = extrude(amount=15, mode=Mode.PRIVATE)
    fillet1_piece_17a = split(fillet1_piece_17a, bisect_by=Plane(origin=(16.516440541, 0.452790229, -4.476923077), z_dir=(0, 0, -1)), keep=Keep.TOP, mode=Mode.PRIVATE)
    with BuildSketch(Plane(origin=(11.969230769, 0, -4.476923077), x_dir=(0, 0, -1), z_dir=(1, 0, 0))) as fillet1_piece_17b_section:
        with BuildLine():
            CenterArc((FILLET1_R, FILLET1_R), FILLET1_R, 180, 90)
            Line((0, FILLET1_R), (0, 0))
            Line((0, 0), (FILLET1_R, 0))
        make_face()
    fillet1_piece_17b = extrude(amount=20, mode=Mode.PRIVATE)
    fillet1_piece_17b = split(fillet1_piece_17b, bisect_by=Plane(origin=(16.969230769, 0.452790229, -4.929713305), z_dir=(-1, 0, 0)), keep=Keep.TOP, mode=Mode.PRIVATE)
    fillet1_piece_17 = fillet1_piece_17a & fillet1_piece_17b
    add(fillet1_piece_17, mode=Mode.SUBTRACT)
    with BuildSketch(Plane(origin=(31.969230769, 0, 5.523076923), x_dir=(0, 0, 1), z_dir=(-1, 0, 0))) as fillet1_piece_18a_section:
        with BuildLine():
            CenterArc((FILLET1_R, FILLET1_R), FILLET1_R, 180, 90)
            Line((0, FILLET1_R), (0, 0))
            Line((0, 0), (FILLET1_R, 0))
        make_face()
    fillet1_piece_18a = extrude(amount=20, mode=Mode.PRIVATE)
    fillet1_piece_18a = split(fillet1_piece_18a, bisect_by=Plane(origin=(16.969230769, 0.452790229, 5.975867152), z_dir=(-1, 0, 0)), keep=Keep.TOP, mode=Mode.PRIVATE)
    with BuildSketch(Plane(origin=(16.969230769, 0, 10.523076923), x_dir=(-1, 0, 0), z_dir=(0, 0, -1))) as fillet1_piece_18b_section:
        with BuildLine():
            CenterArc((FILLET1_R, FILLET1_R), FILLET1_R, 180, 90)
            Line((0, FILLET1_R), (0, 0))
            Line((0, 0), (FILLET1_R, 0))
        make_face()
    fillet1_piece_18b = extrude(amount=15, mode=Mode.PRIVATE)
    fillet1_piece_18b = split(fillet1_piece_18b, bisect_by=Plane(origin=(16.516440541, 0.452790229, 5.523076923), z_dir=(0, 0, 1)), keep=Keep.TOP, mode=Mode.PRIVATE)
    fillet1_piece_18 = fillet1_piece_18a & fillet1_piece_18b
    add(fillet1_piece_18, mode=Mode.SUBTRACT)
    with BuildSketch(Plane(origin=(16.969230769, 8, -9.476923077), x_dir=(-1, 0, 0), z_dir=(0, 0, 1))) as fillet1_piece_19a_section:
        with BuildLine():
            CenterArc((FILLET1_R, FILLET1_R), FILLET1_R, 180, 90)
            Line((0, FILLET1_R), (0, 0))
            Line((0, 0), (FILLET1_R, 0))
        make_face()
    fillet1_piece_19a = extrude(amount=15, mode=Mode.PRIVATE)
    fillet1_piece_19a = split(fillet1_piece_19a, bisect_by=Plane(origin=(16.516440541, 7.547209771, -4.476923077), z_dir=(0, 0, -1)), keep=Keep.TOP, mode=Mode.PRIVATE)
    with BuildSketch(Plane(origin=(31.969230769, 8, -4.476923077), x_dir=(0, 0, -1), z_dir=(-1, 0, 0))) as fillet1_piece_19b_section:
        with BuildLine():
            CenterArc((FILLET1_R, FILLET1_R), FILLET1_R, 180, 90)
            Line((0, FILLET1_R), (0, 0))
            Line((0, 0), (FILLET1_R, 0))
        make_face()
    fillet1_piece_19b = extrude(amount=20, mode=Mode.PRIVATE)
    fillet1_piece_19b = split(fillet1_piece_19b, bisect_by=Plane(origin=(16.969230769, 7.547209771, -4.929713305), z_dir=(-1, 0, 0)), keep=Keep.TOP, mode=Mode.PRIVATE)
    fillet1_piece_19 = fillet1_piece_19a & fillet1_piece_19b
    add(fillet1_piece_19, mode=Mode.SUBTRACT)
    with BuildSketch(Plane(origin=(11.969230769, 8, 5.523076923), x_dir=(0, 0, 1), z_dir=(1, 0, 0))) as fillet1_piece_20a_section:
        with BuildLine():
            CenterArc((FILLET1_R, FILLET1_R), FILLET1_R, 180, 90)
            Line((0, FILLET1_R), (0, 0))
            Line((0, 0), (FILLET1_R, 0))
        make_face()
    fillet1_piece_20a = extrude(amount=20, mode=Mode.PRIVATE)
    fillet1_piece_20a = split(fillet1_piece_20a, bisect_by=Plane(origin=(16.969230769, 7.547209771, 5.975867152), z_dir=(-1, 0, 0)), keep=Keep.TOP, mode=Mode.PRIVATE)
    with BuildSketch(Plane(origin=(16.969230769, 8, -4.476923077), x_dir=(-1, 0, 0), z_dir=(0, 0, 1))) as fillet1_piece_20b_section:
        with BuildLine():
            CenterArc((FILLET1_R, FILLET1_R), FILLET1_R, 180, 90)
            Line((0, FILLET1_R), (0, 0))
            Line((0, 0), (FILLET1_R, 0))
        make_face()
    fillet1_piece_20b = extrude(amount=15, mode=Mode.PRIVATE)
    fillet1_piece_20b = split(fillet1_piece_20b, bisect_by=Plane(origin=(16.516440541, 7.547209771, 5.523076923), z_dir=(0, 0, 1)), keep=Keep.TOP, mode=Mode.PRIVATE)
    fillet1_piece_20 = fillet1_piece_20a & fillet1_piece_20b
    add(fillet1_piece_20, mode=Mode.SUBTRACT)
    with BuildSketch(Plane(origin=(6.537231181, 0, -15.528746464), x_dir=(0.41036467732879783, 0, 0.9119215051751064), z_dir=(-0.9119215051751064, 0, 0.4103646773287979))) as fillet1_piece_21a_section:
        with BuildLine():
            CenterArc((FILLET1_R, FILLET1_R), FILLET1_R, 180, 90)
            Line((0, FILLET1_R), (0, 0))
            Line((0, 0), (FILLET1_R, 0))
        make_face()
    fillet1_piece_21a = extrude(amount=31.931712199, mode=Mode.PRIVATE)
    fillet1_piece_21a = split(fillet1_piece_21a, bisect_by=Plane(origin=(-19.559662553, 0.412155613, -4.476923077), z_dir=(0, 0, 1)), keep=Keep.TOP, mode=Mode.PRIVATE)
    with BuildSketch(Plane(origin=(-13.022376345, 0, -4.476923077), x_dir=(0, 0, 1), z_dir=(-1, 0, 0))) as fillet1_piece_21b_section:
        with BuildLine():
            CenterArc((FILLET1_R, FILLET1_R), FILLET1_R, 180, 90)
            Line((0, FILLET1_R), (0, 0))
            Line((0, 0), (FILLET1_R, 0))
        make_face()
    fillet1_piece_21b = extrude(amount=30.008392886, mode=Mode.PRIVATE)
    fillet1_piece_21b = split(fillet1_piece_21b, bisect_by=Plane(origin=(-16.620491992, 0.412155613, -5.107771036), z_dir=(0.4103646773287979, 0, 0.9119215051751064)), keep=Keep.TOP, mode=Mode.PRIVATE)
    fillet1_piece_21 = fillet1_piece_21a & fillet1_piece_21b
    add(fillet1_piece_21, mode=Mode.SUBTRACT)
    with BuildSketch(Plane(origin=(-22.581983871, 8, -2.42509969), x_dir=(0.4103646773287979, 0, 0.9119215051751064), z_dir=(0.9119215051751064, 0, -0.4103646773287979))) as fillet1_piece_22a_section:
        with BuildLine():
            CenterArc((FILLET1_R, FILLET1_R), FILLET1_R, 180, 90)
            Line((0, FILLET1_R), (0, 0))
            Line((0, 0), (FILLET1_R, 0))
        make_face()
    fillet1_piece_22a = extrude(amount=31.931712199, mode=Mode.PRIVATE)
    fillet1_piece_22a = split(fillet1_piece_22a, bisect_by=Plane(origin=(-19.559662553, 7.587844387, -4.476923077), z_dir=(0, 0, 1)), keep=Keep.TOP, mode=Mode.PRIVATE)
    with BuildSketch(Plane(origin=(-43.030769231, 8, -4.476923077), x_dir=(0, 0, 1), z_dir=(1, 0, 0))) as fillet1_piece_22b_section:
        with BuildLine():
            CenterArc((FILLET1_R, FILLET1_R), FILLET1_R, 180, 90)
            Line((0, FILLET1_R), (0, 0))
            Line((0, 0), (FILLET1_R, 0))
        make_face()
    fillet1_piece_22b = extrude(amount=30.008392886, mode=Mode.PRIVATE)
    fillet1_piece_22b = split(fillet1_piece_22b, bisect_by=Plane(origin=(-16.620491992, 7.587844387, -5.107771036), z_dir=(0.4103646773287979, 0, 0.9119215051751064)), keep=Keep.TOP, mode=Mode.PRIVATE)
    fillet1_piece_22 = fillet1_piece_22a & fillet1_piece_22b
    add(fillet1_piece_22, mode=Mode.SUBTRACT)
    with BuildSketch(Plane(origin=(6.537231181, 8, 16.57490031), x_dir=(0, -1, 0), z_dir=(-0.9119215051751064, 0, -0.41036467732879806))) as fillet1_piece_23a_section:
        with BuildLine():
            CenterArc((FILLET1_R, -FILLET1_R), FILLET1_R, 90, 90)
            Line((0, -FILLET1_R), (0, 0))
            Line((0, 0), (FILLET1_R, 0))
        make_face()
    fillet1_piece_23a = extrude(amount=31.931712199, mode=Mode.PRIVATE)
    fillet1_piece_23a = split(fillet1_piece_23a, bisect_by=Plane(origin=(-19.559662553, 7.587844387, 5.523076923), z_dir=(0, 0, -1)), keep=Keep.TOP, mode=Mode.PRIVATE)
    with BuildSketch(Plane(origin=(-13.022376345, 8, 5.523076923), x_dir=(0, 0, -1), z_dir=(-1, 0, 0))) as fillet1_piece_23b_section:
        with BuildLine():
            CenterArc((FILLET1_R, FILLET1_R), FILLET1_R, 180, 90)
            Line((0, FILLET1_R), (0, 0))
            Line((0, 0), (FILLET1_R, 0))
        make_face()
    fillet1_piece_23b = extrude(amount=30.008392886, mode=Mode.PRIVATE)
    fillet1_piece_23b = split(fillet1_piece_23b, bisect_by=Plane(origin=(-16.620491992, 7.587844387, 6.153924882), z_dir=(0.41036467732879806, 0, -0.9119215051751064)), keep=Keep.TOP, mode=Mode.PRIVATE)
    fillet1_piece_23 = fillet1_piece_23a & fillet1_piece_23b
    add(fillet1_piece_23, mode=Mode.SUBTRACT)
    with BuildSketch(Plane(origin=(-43.030769231, 0, 5.523076923), x_dir=(0, 0, -1), z_dir=(1, 0, 0))) as fillet1_piece_24a_section:
        with BuildLine():
            CenterArc((FILLET1_R, FILLET1_R), FILLET1_R, 180, 90)
            Line((0, FILLET1_R), (0, 0))
            Line((0, 0), (FILLET1_R, 0))
        make_face()
    fillet1_piece_24a = extrude(amount=30.008392886, mode=Mode.PRIVATE)
    fillet1_piece_24a = split(fillet1_piece_24a, bisect_by=Plane(origin=(-16.620491992, 0.412155613, 6.153924882), z_dir=(0.41036467732879806, 0, -0.9119215051751064)), keep=Keep.TOP, mode=Mode.PRIVATE)
    with BuildSketch(Plane(origin=(-22.581983871, 0, 3.471253536), x_dir=(0.41036467732879806, 0, -0.9119215051751064), z_dir=(0.9119215051751064, 0, 0.41036467732879806))) as fillet1_piece_24b_section:
        with BuildLine():
            CenterArc((FILLET1_R, FILLET1_R), FILLET1_R, 180, 90)
            Line((0, FILLET1_R), (0, 0))
            Line((0, 0), (FILLET1_R, 0))
        make_face()
    fillet1_piece_24b = extrude(amount=31.931712199, mode=Mode.PRIVATE)
    fillet1_piece_24b = split(fillet1_piece_24b, bisect_by=Plane(origin=(-19.559662553, 0.412155613, 5.523076923), z_dir=(0, 0, -1)), keep=Keep.TOP, mode=Mode.PRIVATE)
    fillet1_piece_24 = fillet1_piece_24a & fillet1_piece_24b
    add(fillet1_piece_24, mode=Mode.SUBTRACT)

    # Sketch8 → Cut-Extrude5 (cut, through all)
    with BuildSketch(Plane(origin=(0, 0, -4.476923077), x_dir=(-1, 0, 0), z_dir=(0, 0, -1))):
        with Locations(Location((33.909652253, 4, 0), (0, 0, 68.471095594))):
            Circle(SKETCH8_R)
    extrude(amount=-CUT_EXTRUDE5_DEPTH, mode=Mode.SUBTRACT)

    # Sketch9 → Cut-Extrude6 (cut)
    with BuildSketch(Plane(origin=(0, 8, 0), x_dir=(1, 0, 0), z_dir=(0, 1, 0))):
        Polygon((-12.075489078, -0.523076923), (5.969230769, -6.523076923), (5.969230769, 5.476923077), align=None)
    extrude(amount=-CUT_EXTRUDE6_DEPTH, mode=Mode.SUBTRACT)

    # Fillet2
    fillet2_edges = [part.edges().sort_by_distance(p)[0] for p in [
        (-3.053129155, 0, 3.523076923),
        (5.969230769, 0, 0.523076923),
        (-3.053129155, 0, -2.476923077),
        (-12.075489078, 4, 0.523076923),
        (5.969230769, 4, -5.476923077),
        (5.969230769, 4, 6.523076923),
        (-3.053129155, 8, -2.476923077),
        (-3.053129155, 8, 3.523076923),
        (5.969230769, 8, 0.523076923),
    ]]
    fillet(fillet2_edges, radius=FILLET2_R)


solid = part.part
